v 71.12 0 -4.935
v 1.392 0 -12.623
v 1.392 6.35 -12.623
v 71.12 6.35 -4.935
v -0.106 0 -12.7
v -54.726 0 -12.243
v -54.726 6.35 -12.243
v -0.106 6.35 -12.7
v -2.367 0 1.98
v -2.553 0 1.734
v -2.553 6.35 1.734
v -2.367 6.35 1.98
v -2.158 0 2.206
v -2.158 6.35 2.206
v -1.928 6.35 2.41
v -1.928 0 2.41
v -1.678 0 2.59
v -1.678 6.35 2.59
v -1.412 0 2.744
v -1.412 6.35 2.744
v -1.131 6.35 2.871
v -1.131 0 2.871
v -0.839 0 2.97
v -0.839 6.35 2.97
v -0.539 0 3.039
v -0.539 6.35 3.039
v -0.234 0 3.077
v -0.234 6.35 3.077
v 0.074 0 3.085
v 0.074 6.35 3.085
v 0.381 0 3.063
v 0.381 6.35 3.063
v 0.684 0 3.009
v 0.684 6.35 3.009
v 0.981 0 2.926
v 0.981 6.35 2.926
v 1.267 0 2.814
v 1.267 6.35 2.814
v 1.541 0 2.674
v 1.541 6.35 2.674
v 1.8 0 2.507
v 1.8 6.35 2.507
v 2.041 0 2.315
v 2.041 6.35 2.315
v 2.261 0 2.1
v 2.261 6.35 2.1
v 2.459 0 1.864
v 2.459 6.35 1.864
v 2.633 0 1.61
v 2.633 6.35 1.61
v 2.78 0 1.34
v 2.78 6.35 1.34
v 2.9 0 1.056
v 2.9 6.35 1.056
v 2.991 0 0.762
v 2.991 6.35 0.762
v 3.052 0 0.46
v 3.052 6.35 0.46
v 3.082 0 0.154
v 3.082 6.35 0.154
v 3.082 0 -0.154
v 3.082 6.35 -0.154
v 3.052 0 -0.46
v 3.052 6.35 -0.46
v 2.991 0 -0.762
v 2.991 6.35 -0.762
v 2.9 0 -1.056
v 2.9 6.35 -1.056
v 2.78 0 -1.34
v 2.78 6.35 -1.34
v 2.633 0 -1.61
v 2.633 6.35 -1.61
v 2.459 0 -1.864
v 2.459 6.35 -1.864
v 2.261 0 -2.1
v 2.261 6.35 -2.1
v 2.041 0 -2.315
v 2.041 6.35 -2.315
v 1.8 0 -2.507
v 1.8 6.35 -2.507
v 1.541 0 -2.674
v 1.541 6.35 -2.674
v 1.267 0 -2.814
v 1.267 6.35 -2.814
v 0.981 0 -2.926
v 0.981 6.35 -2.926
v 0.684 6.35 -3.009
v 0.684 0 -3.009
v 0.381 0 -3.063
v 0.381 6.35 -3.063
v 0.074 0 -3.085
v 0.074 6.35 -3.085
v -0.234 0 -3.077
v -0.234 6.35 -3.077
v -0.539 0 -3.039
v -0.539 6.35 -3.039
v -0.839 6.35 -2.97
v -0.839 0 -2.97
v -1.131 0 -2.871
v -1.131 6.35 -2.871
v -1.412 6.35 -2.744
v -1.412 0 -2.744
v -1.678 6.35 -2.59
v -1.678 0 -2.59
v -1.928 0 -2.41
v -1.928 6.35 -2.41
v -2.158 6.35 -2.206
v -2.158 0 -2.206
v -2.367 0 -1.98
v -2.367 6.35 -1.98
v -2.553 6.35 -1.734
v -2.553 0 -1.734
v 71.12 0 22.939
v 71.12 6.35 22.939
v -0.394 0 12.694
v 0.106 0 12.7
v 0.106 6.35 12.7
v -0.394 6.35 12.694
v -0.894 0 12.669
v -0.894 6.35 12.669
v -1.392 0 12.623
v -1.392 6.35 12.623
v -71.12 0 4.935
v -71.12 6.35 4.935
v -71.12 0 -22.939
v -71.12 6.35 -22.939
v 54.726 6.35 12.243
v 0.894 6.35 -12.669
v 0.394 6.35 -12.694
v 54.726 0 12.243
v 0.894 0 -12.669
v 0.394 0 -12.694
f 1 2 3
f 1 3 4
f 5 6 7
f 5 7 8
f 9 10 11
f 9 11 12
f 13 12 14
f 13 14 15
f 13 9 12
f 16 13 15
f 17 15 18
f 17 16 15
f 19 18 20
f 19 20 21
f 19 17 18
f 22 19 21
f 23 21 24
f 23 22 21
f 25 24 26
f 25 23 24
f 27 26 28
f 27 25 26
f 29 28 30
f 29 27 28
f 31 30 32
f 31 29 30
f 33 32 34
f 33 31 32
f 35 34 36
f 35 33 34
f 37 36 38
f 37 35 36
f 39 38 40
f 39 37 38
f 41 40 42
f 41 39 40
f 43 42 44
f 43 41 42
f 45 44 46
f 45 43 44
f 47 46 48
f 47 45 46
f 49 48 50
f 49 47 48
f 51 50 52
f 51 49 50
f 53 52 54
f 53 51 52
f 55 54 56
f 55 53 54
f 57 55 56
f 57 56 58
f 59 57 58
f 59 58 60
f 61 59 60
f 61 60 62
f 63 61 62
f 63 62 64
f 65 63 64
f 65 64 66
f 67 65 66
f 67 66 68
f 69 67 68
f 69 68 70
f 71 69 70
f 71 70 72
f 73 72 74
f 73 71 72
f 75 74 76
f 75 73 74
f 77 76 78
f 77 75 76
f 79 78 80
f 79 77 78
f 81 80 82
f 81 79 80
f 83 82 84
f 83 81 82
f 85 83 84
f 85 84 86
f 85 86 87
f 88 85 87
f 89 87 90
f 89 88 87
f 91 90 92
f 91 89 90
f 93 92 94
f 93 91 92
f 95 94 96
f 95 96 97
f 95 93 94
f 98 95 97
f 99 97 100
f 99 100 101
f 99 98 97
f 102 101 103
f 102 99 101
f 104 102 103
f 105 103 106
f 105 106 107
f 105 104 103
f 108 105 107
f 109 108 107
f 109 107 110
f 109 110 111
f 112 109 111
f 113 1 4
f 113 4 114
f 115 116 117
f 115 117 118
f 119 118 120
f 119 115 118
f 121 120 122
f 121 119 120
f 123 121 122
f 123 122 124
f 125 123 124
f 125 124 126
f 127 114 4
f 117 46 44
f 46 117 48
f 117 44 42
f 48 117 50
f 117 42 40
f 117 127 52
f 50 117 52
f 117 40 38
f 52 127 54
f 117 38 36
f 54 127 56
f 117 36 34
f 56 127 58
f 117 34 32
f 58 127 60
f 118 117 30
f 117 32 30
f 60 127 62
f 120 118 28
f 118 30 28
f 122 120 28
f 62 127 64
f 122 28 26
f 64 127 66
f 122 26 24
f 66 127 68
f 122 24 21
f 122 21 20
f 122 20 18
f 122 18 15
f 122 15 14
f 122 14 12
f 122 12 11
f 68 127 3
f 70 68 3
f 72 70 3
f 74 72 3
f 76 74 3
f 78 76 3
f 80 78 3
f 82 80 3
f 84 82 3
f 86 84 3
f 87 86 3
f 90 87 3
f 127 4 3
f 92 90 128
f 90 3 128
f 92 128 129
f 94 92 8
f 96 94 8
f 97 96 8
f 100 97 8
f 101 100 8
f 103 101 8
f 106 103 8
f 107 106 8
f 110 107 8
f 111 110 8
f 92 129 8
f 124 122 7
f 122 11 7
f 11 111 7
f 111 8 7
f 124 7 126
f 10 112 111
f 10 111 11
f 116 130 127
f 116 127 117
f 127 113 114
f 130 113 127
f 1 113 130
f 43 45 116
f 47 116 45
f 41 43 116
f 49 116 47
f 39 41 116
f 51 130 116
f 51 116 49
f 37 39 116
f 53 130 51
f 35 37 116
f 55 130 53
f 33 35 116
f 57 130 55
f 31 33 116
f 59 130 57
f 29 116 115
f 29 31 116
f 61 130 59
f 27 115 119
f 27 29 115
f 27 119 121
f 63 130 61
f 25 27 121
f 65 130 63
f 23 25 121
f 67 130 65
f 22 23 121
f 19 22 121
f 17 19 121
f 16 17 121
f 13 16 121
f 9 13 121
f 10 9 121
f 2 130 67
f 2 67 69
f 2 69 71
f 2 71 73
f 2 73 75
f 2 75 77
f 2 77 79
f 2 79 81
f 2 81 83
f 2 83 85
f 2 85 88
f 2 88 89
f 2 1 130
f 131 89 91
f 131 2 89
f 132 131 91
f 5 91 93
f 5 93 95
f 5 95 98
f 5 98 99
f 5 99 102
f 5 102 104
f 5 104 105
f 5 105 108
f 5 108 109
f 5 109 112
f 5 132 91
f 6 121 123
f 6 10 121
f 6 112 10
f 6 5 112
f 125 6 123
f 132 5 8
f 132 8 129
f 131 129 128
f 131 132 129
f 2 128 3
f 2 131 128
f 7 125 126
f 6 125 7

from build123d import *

# Parameters (mm, degrees)
BOSS_EXTRUDE1_DEPTH = 6.35


with BuildPart() as part:
    # Sketch1 → Boss-Extrude1 (new body)
    with BuildSketch(Plane(origin=(0, 0, 0), x_dir=(1, 0, 0), z_dir=(0, 1, 0))):
        with BuildLine():
            Line((71.12, 4.935349186), (71.12, -22.938860698))
            Line((71.12, -22.938860698), (54.725773369, -12.242694437))
            Line((54.725773369, -12.242694437), (0.106224527, -12.699555754))
            ThreePointArc((0.106224527, -12.699555754), (-0.64393835, -12.683664431), (-1.391853504, -12.623499666))
            Line((-1.391853504, -12.623499666), (-71.12, -4.935349186))
            Line((-71.12, -4.935349186), (-71.12, 22.938860698))
            Line((-71.12, 22.938860698), (-54.725773369, 12.242694437))
            Line((-54.725773369, 12.242694437), (-0.106224527, 12.699555754))
            ThreePointArc((-0.106224527, 12.699555754), (0.64393835, 12.683664431), (1.391853504, 12.623499666))
            Line((1.391853504, 12.623499666), (71.12, 4.935349186))
        make_face()
        with BuildLine():
            Line((-2.5527, 1.734282538), (-2.5527, -1.734282538))
            ThreePointArc((-2.5527, -1.734282538), (3.0861, 0), (-2.5527, 1.734282538))
        make_face(mode=Mode.SUBTRACT)
    extrude(amount=BOSS_EXTRUDE1_DEPTH)


solid = part.part
